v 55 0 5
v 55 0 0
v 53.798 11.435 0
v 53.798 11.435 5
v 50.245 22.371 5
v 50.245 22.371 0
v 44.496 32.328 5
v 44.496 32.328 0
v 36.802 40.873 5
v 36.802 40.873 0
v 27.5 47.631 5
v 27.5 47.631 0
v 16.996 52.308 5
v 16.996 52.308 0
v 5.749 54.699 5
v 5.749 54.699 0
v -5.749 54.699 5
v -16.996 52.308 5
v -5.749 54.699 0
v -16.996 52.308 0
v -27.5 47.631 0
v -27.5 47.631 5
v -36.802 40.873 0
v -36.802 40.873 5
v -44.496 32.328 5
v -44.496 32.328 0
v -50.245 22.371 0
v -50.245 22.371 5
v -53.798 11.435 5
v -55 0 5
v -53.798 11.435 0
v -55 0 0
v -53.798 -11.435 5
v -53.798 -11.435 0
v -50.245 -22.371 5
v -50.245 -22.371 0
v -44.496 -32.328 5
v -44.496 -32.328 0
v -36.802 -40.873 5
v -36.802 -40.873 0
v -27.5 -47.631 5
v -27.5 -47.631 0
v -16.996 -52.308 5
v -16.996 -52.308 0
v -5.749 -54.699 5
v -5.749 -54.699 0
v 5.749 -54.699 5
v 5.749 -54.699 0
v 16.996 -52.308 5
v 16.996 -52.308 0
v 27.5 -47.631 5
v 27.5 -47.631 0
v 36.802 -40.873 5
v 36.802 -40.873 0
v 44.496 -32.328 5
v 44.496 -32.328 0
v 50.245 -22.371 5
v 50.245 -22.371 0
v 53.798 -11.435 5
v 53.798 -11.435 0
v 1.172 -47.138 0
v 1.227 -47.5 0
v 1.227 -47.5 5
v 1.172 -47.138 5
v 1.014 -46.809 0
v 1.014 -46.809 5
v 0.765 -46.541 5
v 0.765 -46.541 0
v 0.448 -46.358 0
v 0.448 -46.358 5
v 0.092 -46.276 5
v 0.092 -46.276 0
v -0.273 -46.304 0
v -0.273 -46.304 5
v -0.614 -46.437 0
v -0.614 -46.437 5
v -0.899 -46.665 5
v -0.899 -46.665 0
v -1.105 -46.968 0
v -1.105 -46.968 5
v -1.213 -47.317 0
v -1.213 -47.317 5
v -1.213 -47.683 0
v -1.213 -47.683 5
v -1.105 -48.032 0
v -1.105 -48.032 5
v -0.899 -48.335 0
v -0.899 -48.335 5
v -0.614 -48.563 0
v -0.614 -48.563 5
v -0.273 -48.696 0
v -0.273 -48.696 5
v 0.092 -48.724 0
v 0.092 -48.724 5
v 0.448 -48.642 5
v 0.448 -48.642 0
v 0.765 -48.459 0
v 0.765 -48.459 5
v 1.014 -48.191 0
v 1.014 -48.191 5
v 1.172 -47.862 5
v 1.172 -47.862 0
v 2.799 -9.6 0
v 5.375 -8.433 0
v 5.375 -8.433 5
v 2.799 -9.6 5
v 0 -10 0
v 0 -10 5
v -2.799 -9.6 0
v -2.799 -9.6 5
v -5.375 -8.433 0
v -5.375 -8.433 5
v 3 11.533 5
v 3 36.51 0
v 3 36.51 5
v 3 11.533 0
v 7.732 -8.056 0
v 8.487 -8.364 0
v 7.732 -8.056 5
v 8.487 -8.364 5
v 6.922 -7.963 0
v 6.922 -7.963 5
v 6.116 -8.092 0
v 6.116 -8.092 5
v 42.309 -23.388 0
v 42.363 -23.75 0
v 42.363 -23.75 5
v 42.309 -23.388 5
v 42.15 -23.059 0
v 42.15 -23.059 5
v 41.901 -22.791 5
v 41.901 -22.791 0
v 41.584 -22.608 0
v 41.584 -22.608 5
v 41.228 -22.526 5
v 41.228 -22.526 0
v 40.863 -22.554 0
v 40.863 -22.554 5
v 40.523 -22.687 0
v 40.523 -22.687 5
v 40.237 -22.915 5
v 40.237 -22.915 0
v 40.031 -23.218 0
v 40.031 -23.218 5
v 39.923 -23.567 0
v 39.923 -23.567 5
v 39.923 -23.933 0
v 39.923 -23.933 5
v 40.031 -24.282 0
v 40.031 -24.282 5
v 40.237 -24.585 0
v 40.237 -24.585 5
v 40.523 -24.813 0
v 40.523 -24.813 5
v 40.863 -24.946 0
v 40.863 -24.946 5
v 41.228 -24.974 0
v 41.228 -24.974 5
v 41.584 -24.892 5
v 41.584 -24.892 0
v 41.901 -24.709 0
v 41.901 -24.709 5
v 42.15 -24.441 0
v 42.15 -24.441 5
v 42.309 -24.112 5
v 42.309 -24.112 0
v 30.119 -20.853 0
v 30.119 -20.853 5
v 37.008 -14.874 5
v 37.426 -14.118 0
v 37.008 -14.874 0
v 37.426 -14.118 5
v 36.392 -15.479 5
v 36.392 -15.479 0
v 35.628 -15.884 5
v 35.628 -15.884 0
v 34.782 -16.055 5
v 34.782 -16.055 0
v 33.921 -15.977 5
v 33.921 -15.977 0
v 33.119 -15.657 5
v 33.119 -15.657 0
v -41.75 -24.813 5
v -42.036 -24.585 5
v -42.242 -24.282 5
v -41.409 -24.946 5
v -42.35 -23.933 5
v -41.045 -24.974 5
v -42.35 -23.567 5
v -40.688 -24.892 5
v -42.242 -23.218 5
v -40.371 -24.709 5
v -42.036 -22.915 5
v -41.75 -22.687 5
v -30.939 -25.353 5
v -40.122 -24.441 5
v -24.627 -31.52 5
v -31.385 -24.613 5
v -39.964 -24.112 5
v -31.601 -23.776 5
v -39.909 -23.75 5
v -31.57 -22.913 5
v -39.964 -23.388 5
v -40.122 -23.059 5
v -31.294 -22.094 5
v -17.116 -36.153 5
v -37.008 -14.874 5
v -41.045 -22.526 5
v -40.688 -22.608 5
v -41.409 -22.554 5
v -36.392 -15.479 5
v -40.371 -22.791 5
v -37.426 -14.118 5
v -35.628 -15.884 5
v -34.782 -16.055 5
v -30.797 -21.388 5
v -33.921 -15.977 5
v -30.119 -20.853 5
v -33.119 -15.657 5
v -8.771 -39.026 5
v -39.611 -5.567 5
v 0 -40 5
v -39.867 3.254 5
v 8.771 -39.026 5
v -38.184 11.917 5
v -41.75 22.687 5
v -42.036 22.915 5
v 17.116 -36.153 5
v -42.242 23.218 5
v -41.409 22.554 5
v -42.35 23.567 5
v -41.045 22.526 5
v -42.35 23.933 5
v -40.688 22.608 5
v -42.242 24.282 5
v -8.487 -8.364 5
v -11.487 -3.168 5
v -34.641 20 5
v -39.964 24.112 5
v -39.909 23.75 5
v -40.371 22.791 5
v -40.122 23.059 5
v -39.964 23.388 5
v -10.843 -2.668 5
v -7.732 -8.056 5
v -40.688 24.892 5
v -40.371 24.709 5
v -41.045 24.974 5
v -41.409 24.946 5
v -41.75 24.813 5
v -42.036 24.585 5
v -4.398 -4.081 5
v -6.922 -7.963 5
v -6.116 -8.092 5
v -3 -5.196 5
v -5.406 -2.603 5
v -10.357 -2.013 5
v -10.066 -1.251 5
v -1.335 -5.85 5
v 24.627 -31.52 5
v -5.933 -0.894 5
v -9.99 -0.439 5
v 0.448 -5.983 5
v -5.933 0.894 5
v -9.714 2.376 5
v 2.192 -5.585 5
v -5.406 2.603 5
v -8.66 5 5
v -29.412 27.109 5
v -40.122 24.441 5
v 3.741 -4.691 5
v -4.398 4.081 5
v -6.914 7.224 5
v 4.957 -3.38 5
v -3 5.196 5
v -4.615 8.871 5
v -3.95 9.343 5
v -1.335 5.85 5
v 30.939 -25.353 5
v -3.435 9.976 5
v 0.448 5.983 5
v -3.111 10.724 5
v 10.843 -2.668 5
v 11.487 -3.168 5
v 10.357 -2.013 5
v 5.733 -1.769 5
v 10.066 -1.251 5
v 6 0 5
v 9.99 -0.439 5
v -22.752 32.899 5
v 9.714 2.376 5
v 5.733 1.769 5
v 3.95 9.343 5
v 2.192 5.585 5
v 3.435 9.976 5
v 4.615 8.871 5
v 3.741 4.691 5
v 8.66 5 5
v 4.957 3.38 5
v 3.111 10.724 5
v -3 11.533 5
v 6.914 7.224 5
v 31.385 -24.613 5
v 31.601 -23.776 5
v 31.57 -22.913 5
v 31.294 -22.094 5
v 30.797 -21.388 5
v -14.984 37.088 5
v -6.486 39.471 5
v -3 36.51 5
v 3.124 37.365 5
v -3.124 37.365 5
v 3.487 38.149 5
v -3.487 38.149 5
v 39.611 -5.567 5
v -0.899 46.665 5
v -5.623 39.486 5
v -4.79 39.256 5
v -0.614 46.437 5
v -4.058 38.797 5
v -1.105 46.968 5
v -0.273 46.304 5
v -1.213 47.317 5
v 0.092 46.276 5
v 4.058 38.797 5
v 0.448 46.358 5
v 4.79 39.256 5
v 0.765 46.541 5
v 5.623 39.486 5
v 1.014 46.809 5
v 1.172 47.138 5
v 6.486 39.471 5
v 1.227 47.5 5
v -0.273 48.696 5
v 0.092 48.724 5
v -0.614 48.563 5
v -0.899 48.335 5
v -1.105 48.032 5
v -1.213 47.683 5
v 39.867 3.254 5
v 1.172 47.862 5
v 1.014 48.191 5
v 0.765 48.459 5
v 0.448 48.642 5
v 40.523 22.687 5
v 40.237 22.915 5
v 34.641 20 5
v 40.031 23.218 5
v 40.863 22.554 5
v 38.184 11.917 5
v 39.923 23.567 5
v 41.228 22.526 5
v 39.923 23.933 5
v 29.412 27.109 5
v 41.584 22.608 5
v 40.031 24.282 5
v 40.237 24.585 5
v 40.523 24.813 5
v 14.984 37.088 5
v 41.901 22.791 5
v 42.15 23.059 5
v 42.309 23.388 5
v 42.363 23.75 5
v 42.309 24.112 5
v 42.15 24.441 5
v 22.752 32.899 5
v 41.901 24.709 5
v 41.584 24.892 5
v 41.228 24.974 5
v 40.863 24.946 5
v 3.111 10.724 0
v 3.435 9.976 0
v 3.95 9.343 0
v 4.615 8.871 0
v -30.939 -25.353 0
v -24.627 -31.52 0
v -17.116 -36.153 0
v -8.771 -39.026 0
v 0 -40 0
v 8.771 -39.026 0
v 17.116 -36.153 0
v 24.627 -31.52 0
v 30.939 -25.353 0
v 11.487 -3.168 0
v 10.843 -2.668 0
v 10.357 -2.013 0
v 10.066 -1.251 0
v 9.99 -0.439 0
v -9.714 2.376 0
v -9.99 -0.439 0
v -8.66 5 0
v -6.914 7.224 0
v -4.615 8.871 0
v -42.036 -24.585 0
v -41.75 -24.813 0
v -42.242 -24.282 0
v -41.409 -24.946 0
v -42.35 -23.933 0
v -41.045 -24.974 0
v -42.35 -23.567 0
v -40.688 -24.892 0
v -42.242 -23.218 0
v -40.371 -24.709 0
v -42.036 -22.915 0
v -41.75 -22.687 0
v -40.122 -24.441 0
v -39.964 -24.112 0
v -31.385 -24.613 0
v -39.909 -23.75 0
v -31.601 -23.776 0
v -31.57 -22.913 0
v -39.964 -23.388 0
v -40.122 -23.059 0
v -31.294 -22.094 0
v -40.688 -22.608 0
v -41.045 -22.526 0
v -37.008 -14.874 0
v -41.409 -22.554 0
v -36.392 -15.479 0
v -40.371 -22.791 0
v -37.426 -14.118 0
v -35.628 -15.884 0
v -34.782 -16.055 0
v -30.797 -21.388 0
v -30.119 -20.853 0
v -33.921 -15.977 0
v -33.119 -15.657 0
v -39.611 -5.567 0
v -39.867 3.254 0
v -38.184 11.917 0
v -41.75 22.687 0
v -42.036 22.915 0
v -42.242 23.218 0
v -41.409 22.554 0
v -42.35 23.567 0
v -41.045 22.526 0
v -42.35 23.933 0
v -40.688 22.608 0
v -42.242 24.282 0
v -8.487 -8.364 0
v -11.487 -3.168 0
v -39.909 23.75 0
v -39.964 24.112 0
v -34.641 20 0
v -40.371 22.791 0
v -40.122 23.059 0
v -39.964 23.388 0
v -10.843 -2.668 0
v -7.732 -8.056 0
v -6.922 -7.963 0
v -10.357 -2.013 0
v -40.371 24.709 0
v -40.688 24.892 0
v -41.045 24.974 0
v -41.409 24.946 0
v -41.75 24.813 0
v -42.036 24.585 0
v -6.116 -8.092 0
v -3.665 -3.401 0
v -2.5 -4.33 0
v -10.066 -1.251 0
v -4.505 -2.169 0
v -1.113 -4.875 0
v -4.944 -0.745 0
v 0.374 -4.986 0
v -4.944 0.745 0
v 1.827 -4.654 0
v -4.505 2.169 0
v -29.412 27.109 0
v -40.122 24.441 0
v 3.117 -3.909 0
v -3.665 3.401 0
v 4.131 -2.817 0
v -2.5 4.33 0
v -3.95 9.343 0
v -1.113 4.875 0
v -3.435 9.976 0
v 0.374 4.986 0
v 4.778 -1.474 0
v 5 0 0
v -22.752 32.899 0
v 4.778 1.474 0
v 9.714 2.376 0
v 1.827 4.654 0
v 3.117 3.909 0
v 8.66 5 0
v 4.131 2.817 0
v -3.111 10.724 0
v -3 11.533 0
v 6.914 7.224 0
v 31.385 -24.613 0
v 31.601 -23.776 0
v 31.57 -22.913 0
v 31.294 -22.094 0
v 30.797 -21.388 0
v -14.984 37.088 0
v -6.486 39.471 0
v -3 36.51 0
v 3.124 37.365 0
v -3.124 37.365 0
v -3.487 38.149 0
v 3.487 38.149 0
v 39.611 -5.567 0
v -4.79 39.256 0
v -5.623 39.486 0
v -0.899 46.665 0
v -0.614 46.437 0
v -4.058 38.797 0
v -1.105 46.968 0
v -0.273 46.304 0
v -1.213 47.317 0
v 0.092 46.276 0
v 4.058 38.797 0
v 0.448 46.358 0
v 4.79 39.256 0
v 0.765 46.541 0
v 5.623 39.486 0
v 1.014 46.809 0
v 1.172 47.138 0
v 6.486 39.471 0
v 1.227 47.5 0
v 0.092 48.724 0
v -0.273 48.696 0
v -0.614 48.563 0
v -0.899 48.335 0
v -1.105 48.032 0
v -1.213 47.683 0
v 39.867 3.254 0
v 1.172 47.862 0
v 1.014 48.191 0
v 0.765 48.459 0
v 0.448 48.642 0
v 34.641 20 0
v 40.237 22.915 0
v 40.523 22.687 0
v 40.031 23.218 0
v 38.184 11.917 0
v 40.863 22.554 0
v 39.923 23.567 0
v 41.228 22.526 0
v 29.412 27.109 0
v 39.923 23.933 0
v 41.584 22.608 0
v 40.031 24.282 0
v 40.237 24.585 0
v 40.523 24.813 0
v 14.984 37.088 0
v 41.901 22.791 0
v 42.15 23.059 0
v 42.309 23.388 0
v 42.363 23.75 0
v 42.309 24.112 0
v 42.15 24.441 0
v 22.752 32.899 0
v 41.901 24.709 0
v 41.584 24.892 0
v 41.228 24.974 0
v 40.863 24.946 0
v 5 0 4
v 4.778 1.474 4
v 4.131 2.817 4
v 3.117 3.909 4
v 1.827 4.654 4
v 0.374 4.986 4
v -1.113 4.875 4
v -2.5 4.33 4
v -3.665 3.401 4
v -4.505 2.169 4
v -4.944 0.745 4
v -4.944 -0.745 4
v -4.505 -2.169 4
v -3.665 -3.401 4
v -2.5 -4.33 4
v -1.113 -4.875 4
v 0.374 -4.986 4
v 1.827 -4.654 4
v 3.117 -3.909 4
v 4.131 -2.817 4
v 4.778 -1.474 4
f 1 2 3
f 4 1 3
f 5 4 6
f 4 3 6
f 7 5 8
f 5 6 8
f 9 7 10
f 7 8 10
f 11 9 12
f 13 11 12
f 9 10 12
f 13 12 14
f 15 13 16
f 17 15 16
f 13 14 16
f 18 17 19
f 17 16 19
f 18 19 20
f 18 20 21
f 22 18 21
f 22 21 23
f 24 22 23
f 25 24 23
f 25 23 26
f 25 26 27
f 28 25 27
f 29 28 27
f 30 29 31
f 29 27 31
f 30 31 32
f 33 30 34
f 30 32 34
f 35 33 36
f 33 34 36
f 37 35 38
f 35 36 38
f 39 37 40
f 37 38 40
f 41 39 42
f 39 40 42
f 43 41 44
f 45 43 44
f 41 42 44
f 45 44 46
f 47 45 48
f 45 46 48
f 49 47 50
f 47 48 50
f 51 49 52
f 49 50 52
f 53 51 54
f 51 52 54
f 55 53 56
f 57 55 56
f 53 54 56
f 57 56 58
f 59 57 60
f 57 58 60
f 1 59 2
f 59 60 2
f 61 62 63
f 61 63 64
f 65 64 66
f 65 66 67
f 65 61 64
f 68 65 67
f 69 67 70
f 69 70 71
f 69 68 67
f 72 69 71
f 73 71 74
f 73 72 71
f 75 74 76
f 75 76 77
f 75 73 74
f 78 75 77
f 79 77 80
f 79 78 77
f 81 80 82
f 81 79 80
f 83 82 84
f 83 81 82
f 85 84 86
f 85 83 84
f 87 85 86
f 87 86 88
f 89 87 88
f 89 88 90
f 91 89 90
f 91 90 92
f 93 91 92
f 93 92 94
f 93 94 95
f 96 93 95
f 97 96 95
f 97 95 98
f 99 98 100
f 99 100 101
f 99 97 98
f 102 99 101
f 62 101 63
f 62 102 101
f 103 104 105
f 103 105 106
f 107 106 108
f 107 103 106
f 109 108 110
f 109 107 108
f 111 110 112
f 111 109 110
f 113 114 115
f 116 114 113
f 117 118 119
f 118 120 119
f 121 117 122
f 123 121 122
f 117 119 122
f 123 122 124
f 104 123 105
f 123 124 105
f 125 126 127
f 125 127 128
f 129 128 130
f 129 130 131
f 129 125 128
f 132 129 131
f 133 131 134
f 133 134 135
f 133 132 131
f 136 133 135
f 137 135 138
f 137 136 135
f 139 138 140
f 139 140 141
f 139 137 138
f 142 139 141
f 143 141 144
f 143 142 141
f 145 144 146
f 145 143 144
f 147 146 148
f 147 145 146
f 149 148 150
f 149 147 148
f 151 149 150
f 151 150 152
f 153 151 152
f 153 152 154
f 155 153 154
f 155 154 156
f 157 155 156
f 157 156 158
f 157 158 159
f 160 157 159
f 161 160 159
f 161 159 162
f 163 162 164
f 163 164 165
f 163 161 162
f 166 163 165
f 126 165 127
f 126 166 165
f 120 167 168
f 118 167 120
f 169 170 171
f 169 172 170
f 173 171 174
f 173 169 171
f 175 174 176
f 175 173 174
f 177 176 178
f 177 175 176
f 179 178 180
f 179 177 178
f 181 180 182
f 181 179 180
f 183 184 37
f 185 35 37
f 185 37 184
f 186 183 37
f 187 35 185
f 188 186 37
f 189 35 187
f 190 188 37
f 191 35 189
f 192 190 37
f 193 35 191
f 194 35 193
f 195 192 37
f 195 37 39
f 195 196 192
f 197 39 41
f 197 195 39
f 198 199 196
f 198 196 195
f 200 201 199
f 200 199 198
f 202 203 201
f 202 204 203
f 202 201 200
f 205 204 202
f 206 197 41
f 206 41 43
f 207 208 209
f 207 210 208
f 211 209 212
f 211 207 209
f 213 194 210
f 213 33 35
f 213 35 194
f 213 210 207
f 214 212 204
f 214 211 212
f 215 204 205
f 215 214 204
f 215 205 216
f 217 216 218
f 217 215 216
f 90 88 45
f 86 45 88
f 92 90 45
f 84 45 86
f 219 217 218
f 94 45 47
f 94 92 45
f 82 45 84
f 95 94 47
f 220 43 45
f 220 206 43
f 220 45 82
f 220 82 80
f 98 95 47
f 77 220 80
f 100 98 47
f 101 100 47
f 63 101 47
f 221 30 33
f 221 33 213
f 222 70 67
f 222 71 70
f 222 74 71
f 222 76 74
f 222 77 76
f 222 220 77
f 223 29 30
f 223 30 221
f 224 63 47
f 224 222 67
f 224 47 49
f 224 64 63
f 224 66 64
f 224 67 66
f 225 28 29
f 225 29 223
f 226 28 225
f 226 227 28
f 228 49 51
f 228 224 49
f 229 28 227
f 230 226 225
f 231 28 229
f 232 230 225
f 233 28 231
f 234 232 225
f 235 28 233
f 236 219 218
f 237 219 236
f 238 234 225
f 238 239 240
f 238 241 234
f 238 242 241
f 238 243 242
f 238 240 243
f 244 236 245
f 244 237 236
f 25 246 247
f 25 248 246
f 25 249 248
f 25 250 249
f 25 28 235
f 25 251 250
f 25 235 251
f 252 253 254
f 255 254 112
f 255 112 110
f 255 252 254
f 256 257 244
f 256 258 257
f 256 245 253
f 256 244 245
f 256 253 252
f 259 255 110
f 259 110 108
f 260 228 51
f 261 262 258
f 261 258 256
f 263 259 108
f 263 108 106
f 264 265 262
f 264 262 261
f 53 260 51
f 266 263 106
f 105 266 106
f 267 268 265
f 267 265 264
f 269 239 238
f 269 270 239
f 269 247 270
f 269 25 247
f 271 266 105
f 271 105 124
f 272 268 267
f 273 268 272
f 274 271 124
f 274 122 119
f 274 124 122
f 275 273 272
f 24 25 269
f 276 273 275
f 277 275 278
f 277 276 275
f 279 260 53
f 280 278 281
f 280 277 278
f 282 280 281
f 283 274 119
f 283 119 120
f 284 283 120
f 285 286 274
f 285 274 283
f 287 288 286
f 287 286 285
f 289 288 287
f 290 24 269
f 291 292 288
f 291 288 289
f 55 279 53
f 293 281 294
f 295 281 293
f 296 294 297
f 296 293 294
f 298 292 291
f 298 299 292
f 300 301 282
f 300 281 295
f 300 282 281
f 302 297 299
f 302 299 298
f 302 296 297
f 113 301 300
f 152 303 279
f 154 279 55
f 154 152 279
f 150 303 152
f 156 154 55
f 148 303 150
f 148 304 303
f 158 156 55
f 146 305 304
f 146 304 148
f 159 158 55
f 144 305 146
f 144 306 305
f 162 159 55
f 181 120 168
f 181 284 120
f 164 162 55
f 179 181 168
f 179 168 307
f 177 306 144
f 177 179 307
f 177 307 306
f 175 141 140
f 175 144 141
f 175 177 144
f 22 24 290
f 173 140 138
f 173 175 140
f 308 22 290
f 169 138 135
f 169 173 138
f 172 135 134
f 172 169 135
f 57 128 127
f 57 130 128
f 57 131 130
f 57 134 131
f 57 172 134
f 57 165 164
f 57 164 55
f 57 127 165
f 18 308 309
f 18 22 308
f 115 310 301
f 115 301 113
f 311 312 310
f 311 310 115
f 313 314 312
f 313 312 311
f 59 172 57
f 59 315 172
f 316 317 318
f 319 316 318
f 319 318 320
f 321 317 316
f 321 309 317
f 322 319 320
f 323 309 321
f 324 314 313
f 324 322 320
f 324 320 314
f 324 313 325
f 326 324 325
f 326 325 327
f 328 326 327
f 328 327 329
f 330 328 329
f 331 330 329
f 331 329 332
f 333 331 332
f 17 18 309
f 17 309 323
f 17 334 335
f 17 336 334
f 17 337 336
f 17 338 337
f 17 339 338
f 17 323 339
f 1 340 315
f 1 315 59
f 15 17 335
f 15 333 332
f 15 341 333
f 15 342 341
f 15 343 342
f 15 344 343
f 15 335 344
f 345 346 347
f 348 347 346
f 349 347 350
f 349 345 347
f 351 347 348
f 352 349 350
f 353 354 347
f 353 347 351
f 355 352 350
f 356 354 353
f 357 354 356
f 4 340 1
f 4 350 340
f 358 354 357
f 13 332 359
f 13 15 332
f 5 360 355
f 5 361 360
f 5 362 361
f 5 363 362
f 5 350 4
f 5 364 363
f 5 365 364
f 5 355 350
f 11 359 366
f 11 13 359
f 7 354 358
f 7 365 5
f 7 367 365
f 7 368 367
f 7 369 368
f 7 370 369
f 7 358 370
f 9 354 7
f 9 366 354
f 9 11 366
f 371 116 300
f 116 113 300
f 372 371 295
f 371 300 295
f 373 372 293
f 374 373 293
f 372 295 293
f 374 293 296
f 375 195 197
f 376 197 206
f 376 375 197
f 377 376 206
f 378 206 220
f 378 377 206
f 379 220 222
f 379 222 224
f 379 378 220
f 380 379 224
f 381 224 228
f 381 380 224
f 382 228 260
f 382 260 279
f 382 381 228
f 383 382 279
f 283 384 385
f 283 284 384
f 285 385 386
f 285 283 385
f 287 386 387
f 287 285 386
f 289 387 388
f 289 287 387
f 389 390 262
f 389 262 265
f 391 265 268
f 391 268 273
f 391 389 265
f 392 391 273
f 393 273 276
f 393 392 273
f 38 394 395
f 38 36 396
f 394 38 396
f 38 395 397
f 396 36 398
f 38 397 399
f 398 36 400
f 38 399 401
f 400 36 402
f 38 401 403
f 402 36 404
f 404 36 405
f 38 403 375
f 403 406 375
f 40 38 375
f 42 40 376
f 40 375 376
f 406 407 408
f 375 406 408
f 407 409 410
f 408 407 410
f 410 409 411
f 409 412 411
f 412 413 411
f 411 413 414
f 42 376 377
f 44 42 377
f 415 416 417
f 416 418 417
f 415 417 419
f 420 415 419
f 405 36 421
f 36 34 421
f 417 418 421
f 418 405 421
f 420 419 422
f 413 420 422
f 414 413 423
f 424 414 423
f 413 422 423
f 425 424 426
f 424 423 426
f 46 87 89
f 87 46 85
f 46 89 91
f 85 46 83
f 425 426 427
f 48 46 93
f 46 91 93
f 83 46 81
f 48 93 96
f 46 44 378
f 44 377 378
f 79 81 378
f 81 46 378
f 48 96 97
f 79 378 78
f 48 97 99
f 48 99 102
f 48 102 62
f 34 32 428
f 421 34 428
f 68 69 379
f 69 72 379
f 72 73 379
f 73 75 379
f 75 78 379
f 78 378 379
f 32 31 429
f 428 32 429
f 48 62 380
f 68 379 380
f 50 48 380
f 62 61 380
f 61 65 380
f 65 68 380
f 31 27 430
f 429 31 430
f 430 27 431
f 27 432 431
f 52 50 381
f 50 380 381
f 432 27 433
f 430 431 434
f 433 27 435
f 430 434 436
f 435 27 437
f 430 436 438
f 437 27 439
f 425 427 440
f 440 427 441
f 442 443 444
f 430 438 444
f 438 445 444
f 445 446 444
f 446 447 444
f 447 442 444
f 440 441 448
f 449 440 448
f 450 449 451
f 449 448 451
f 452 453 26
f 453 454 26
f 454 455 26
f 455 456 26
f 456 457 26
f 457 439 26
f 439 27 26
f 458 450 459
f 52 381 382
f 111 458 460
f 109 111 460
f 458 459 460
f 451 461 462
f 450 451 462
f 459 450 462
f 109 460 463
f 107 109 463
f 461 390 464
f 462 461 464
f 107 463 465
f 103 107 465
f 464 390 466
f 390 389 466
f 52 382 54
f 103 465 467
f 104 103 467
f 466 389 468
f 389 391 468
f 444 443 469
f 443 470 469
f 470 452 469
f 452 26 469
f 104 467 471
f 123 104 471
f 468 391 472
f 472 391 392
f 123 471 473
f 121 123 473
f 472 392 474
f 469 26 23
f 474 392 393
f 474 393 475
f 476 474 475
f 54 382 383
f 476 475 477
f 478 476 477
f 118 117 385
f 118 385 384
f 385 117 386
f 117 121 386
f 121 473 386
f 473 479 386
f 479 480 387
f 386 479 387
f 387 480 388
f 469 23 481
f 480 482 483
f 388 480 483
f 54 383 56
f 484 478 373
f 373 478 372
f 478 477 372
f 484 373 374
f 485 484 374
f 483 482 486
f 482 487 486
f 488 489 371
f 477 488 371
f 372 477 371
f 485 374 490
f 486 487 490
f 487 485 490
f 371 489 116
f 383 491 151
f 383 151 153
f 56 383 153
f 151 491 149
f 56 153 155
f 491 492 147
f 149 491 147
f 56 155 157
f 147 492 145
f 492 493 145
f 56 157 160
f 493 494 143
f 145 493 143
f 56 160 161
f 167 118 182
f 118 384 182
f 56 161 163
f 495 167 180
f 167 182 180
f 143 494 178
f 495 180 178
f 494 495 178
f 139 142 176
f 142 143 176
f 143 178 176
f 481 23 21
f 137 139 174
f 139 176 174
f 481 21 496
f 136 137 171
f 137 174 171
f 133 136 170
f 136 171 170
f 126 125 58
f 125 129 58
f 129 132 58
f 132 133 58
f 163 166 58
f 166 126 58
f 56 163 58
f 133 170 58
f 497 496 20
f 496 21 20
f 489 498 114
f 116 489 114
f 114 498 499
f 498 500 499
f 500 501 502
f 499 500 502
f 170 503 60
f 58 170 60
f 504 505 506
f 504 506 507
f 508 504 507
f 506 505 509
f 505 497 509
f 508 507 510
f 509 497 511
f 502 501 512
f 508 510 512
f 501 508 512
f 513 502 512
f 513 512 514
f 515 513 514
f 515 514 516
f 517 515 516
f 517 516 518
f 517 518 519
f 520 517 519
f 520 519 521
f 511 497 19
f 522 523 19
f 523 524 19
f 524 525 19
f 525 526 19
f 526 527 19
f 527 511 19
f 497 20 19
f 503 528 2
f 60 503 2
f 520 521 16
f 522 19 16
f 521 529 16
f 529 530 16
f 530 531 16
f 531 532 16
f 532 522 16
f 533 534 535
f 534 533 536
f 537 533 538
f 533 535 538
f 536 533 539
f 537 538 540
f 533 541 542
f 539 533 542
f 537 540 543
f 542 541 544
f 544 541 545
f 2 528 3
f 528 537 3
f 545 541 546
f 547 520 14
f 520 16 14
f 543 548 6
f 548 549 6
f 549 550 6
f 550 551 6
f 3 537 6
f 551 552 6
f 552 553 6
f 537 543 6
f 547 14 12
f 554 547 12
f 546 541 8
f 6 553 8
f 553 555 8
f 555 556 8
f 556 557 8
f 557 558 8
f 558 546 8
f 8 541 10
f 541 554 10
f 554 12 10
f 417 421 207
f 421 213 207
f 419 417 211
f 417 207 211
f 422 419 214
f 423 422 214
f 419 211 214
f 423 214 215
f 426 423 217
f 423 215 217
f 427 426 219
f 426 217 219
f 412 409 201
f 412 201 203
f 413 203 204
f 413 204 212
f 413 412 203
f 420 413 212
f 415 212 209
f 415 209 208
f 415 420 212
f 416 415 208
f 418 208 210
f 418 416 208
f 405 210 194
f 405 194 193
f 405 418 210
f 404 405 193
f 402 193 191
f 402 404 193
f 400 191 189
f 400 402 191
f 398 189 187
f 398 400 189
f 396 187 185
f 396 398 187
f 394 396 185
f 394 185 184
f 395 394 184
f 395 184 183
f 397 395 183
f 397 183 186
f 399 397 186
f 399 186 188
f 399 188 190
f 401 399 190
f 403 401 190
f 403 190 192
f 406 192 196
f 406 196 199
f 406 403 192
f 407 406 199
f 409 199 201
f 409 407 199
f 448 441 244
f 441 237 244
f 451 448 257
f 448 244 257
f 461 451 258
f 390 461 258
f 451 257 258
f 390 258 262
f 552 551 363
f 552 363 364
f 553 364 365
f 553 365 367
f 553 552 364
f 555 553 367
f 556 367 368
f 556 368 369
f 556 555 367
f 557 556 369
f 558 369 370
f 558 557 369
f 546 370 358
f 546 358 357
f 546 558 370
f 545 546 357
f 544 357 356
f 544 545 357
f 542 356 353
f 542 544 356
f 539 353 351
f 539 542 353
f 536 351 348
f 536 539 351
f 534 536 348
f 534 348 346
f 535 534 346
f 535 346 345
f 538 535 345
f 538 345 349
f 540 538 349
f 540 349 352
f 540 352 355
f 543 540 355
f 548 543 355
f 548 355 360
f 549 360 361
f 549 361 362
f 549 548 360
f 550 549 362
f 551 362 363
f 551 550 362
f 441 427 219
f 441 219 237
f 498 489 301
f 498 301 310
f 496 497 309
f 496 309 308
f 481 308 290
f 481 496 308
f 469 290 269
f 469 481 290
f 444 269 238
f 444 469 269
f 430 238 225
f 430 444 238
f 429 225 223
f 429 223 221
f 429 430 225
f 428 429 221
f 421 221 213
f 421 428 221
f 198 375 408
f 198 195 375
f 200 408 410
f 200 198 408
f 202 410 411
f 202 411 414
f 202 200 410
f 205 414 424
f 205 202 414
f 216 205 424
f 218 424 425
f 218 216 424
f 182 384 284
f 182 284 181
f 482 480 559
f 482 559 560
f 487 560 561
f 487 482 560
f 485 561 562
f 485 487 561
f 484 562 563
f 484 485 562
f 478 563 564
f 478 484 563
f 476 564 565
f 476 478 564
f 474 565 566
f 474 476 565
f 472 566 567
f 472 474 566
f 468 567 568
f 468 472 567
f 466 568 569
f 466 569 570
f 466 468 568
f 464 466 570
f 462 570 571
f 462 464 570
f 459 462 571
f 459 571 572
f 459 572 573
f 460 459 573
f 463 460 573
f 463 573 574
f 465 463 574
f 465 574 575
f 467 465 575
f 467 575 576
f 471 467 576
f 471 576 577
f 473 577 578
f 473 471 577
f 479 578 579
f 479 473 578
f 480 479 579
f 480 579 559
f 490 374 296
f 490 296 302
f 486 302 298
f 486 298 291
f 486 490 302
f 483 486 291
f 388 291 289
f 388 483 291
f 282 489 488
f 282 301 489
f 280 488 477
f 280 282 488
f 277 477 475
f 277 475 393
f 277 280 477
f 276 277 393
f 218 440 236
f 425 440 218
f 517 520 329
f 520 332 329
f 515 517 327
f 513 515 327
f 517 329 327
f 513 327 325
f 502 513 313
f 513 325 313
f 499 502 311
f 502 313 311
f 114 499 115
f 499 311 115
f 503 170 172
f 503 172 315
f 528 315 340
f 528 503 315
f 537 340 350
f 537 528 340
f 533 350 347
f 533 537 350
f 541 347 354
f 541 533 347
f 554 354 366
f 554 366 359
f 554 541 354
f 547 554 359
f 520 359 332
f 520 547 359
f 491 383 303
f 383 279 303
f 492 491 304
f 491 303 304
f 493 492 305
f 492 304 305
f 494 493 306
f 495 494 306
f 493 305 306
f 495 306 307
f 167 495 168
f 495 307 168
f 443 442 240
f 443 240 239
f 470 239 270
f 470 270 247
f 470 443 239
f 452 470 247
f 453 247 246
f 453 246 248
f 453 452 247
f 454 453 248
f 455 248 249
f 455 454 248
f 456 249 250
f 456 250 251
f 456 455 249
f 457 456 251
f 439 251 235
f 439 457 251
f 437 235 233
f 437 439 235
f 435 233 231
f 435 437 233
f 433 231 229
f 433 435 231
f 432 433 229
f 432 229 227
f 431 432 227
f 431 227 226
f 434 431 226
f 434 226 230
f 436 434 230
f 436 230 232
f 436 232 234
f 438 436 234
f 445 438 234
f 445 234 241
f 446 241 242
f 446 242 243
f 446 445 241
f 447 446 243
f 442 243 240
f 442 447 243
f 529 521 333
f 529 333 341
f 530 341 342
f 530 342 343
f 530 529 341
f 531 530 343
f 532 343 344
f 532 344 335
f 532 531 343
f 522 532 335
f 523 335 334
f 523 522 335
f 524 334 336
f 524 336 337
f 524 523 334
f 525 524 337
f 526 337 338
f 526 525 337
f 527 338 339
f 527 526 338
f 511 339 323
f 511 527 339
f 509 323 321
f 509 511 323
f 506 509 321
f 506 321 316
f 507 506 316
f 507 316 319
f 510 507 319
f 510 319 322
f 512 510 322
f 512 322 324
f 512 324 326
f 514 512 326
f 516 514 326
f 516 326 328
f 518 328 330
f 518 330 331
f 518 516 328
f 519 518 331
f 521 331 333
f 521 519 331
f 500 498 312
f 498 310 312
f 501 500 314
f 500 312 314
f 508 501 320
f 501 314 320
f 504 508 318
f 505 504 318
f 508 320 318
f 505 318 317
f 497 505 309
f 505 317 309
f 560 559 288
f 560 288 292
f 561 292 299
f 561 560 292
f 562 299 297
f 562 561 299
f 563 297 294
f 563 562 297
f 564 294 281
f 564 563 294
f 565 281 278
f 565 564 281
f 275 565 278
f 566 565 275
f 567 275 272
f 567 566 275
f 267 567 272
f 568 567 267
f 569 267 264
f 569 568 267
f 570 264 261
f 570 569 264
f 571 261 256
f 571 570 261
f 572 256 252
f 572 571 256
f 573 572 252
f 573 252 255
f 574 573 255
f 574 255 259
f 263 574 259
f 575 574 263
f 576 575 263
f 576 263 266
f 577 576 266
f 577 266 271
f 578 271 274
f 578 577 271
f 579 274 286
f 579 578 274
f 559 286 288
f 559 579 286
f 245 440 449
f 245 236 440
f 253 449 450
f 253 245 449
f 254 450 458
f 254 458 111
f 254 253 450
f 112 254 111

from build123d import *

# Parameters (mm, degrees)
ESQUISSE1_R        = 55
ESQUISSE1_R_2      = 1.227
ESQUISSE1_R_3      = 5
BOSS_EXTRU_1_DEPTH = 5
CONG_1_R           = 3
CHANFREIN1_SIZE    = 1


with BuildPart() as part:
    # Esquisse1 → Boss.-Extru.1 (new body)
    with BuildSketch(Plane.XY):
        Circle(ESQUISSE1_R)
        with Locations((-41.13620668, 23.75)):
            Circle(ESQUISSE1_R_2, mode=Mode.SUBTRACT)
        with Locations((-41.13620668, -23.75)):
            Circle(ESQUISSE1_R_2, mode=Mode.SUBTRACT)
        with Locations((0, -47.5)):
            Circle(ESQUISSE1_R_2, mode=Mode.SUBTRACT)
        with Locations((41.13620668, -23.75)):
            Circle(ESQUISSE1_R_2, mode=Mode.SUBTRACT)
        with Locations((41.13620668, 23.75)):
            Circle(ESQUISSE1_R_2, mode=Mode.SUBTRACT)
        with Locations((0, 47.5)):
            Circle(ESQUISSE1_R_2, mode=Mode.SUBTRACT)
        Circle(ESQUISSE1_R_3, mode=Mode.SUBTRACT)
        with BuildLine():
            ThreePointArc((36.043450899, -17.345594464), (34.641016151, 20), (3, 39.88734135))
            Line((3, 39.88734135), (3, 9.539392014))
            ThreePointArc((3, 9.539392014), (8.660254038, 5), (9.761355821, -2.171619796))
            Line((9.761355821, -2.171619796), (36.043450899, -17.345594464))
        make_face(mode=Mode.SUBTRACT)
        with BuildLine():
            ThreePointArc((-33.043450899, -22.541746887), (0, -40), (33.043450899, -22.541746887))
            Line((33.043450899, -22.541746887), (6.761355821, -7.367772218))
            ThreePointArc((6.761355821, -7.367772218), (0, -10), (-6.761355821, -7.367772218))
            Line((-6.761355821, -7.367772218), (-33.043450899, -22.541746887))
        make_face(mode=Mode.SUBTRACT)
        with BuildLine():
            Line((-3, 9.539392014), (-3, 39.88734135))
            ThreePointArc((-3, 39.88734135), (-34.641016151, 20), (-36.043450899, -17.345594464))
            Line((-36.043450899, -17.345594464), (-9.761355821, -2.171619796))
            ThreePointArc((-9.761355821, -2.171619796), (-8.660254038, 5), (-3, 9.539392014))
        make_face(mode=Mode.SUBTRACT)
    extrude(amount=BOSS_EXTRU_1_DEPTH)

    # Congé1
    cong_1_edges = [part.edges().sort_by_distance(p)[0] for p in [
        (-3, 39.88734135, 2.5),
        (-36.043450899, -17.345594464, 2.5),
        (-9.761355821, -2.171619796, 2.5),
        (-3, 9.539392014, 2.5),
        (33.043450899, -22.541746887, 2.5),
        (6.761355821, -7.367772218, 2.5),
        (-6.761355821, -7.367772218, 2.5),
        (-33.043450899, -22.541746887, 2.5),
        (3, 39.88734135, 2.5),
        (3, 9.539392014, 2.5),
        (9.761355821, -2.171619796, 2.5),
        (36.043450899, -17.345594464, 2.5),
    ]]
    fillet(cong_1_edges, radius=CONG_1_R)

    # Chanfrein1
    chanfrein1_edges = [part.edges().sort_by_distance(p)[0] for p in [
        (-5, 0, 5),
    ]]
    chamfer(chanfrein1_edges, length=CHANFREIN1_SIZE)


solid = part.part
